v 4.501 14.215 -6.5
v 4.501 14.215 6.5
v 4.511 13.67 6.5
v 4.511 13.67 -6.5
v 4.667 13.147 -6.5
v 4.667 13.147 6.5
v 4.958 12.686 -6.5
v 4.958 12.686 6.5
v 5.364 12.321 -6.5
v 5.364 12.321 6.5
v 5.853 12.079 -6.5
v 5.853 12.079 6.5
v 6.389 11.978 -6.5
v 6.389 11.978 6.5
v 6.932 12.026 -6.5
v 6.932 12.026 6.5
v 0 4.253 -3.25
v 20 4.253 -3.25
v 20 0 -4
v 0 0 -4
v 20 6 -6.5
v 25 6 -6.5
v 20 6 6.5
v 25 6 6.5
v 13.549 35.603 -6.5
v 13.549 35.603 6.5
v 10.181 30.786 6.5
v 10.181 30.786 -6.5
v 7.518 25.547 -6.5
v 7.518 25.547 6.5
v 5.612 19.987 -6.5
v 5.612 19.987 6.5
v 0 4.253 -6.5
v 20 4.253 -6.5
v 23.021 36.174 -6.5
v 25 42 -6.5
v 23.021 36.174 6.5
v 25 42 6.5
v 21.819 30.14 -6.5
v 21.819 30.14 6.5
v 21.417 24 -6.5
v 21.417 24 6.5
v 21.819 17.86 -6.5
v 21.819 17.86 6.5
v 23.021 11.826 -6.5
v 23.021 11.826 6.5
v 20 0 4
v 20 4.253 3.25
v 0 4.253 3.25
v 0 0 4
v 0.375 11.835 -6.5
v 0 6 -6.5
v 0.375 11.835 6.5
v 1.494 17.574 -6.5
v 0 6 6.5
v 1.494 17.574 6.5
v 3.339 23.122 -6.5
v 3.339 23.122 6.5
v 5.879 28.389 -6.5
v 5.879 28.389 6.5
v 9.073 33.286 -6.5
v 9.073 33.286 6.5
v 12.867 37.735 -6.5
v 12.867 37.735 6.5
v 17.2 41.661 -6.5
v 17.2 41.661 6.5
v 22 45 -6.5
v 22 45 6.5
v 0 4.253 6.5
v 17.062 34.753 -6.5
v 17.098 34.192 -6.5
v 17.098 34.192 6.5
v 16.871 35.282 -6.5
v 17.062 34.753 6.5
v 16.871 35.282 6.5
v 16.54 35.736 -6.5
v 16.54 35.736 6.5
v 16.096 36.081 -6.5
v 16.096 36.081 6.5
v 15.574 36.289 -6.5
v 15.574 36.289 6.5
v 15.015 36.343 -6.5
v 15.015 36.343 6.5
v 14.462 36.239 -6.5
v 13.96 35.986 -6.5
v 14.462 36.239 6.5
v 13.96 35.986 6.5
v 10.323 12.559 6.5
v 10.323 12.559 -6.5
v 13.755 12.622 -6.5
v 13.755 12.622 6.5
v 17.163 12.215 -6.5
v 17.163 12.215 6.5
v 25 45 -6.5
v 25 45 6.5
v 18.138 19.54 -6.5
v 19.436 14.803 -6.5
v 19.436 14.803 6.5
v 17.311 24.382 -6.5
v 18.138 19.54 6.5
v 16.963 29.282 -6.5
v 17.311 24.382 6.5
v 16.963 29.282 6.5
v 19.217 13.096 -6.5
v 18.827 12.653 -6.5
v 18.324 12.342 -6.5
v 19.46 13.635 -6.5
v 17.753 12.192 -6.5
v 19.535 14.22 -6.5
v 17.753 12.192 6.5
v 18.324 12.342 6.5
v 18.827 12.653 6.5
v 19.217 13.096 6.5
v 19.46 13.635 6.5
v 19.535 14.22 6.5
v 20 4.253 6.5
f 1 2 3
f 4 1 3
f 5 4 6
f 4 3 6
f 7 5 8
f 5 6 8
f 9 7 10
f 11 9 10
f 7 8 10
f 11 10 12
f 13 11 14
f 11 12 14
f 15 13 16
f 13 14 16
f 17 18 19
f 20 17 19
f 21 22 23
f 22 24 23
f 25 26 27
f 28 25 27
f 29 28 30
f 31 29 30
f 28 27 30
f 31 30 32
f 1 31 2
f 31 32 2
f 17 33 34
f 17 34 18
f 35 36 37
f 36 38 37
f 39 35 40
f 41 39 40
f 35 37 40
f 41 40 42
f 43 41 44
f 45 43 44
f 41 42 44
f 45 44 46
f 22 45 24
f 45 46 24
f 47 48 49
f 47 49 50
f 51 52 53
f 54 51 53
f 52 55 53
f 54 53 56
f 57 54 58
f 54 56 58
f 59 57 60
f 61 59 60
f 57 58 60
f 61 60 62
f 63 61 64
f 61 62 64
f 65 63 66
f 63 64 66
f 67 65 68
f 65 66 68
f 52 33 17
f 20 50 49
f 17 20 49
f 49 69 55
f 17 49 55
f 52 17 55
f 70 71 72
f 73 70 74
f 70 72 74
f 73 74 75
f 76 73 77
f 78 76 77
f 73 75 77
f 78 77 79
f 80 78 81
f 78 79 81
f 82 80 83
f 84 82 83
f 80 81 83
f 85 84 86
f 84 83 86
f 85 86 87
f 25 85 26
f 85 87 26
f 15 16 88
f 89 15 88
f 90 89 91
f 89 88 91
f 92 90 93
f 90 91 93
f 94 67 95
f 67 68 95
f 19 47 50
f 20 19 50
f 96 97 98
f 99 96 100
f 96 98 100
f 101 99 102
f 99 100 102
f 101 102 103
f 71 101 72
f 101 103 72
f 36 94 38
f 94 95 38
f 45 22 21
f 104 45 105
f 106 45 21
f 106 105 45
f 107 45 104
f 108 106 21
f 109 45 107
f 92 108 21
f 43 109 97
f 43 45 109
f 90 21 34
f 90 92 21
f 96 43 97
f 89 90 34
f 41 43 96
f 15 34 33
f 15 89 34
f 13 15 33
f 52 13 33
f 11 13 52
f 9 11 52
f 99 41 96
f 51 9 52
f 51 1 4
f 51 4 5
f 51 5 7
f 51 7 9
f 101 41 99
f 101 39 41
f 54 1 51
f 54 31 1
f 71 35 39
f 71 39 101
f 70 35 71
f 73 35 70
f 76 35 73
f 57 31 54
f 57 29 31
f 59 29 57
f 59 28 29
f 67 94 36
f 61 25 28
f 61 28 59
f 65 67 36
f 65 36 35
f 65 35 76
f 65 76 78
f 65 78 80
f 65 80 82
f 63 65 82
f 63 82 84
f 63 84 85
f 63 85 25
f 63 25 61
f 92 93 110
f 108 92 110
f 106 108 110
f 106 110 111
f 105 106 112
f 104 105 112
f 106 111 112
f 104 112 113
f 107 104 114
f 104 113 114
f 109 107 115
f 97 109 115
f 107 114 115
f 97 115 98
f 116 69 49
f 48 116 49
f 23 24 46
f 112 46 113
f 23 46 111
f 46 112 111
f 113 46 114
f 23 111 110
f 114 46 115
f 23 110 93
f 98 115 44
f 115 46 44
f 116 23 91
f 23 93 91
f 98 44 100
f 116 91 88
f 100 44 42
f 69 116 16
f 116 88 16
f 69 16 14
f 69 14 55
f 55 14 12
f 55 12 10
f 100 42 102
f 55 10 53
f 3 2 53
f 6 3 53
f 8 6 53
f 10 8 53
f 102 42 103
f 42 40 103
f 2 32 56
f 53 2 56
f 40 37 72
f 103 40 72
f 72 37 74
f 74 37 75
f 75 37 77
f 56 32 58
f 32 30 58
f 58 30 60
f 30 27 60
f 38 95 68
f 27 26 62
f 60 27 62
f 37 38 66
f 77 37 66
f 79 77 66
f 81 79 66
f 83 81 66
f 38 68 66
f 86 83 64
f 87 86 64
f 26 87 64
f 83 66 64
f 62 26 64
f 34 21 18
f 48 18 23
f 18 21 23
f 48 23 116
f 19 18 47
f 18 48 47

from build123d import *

# Parameters (mm, degrees)
EXTRUDE_1_DEPTH     = 6.5
CUT_EXTRUDE_1_DEPTH = 52.886896226
CUT_EXTRUDE_2_DEPTH = 54.09425581


with BuildPart() as part:
    # 草图1 → 凸台-拉伸1 (new, symmetric)
    with BuildSketch(Plane.XY):
        with BuildLine():
            Line((0, 0), (0, 6))
            ThreePointArc((0, 6), (5.87927664, 28.388613177), (22, 45))
            Line((22, 45), (25, 45))
            Line((25, 45), (25, 42))
            ThreePointArc((25, 42), (21.416586692, 24), (25, 6))
            Line((25, 6), (20, 6))
            Line((20, 6), (20, 0))
            Line((20, 0), (0, 0))
        make_face()
    extrude(amount=EXTRUDE_1_DEPTH, both=True)

    # 草图2 → 切除-拉伸1 (cut, through all)
    with BuildSketch(Plane.ZY):
        Polygon((6.5, 4.253461365), (3.25, 4.253461365), (4, 0), (6.5, 0), align=None)
        Polygon((-4, 0), (-6.5, 0), (-6.5, 4.253461365), (-3.25, 4.253461365), align=None)
    extrude(amount=-CUT_EXTRUDE_1_DEPTH, mode=Mode.SUBTRACT)

    # 草图3 → 切除-拉伸2 (cut, through all)
    with BuildSketch(Plane.XY.offset(6.5)):
        with BuildLine():
            ThreePointArc((6.932463861, 12.026105414), (12.037858369, 12.649666202), (17.162813582, 12.215252555))
            ThreePointArc((17.162813582, 12.215252555), (19.038256161, 12.860028298), (19.436438993, 14.802828097))
            ThreePointArc((19.436438993, 14.802828097), (17.311240055, 24.38211379), (17.097768587, 34.191987125))
            ThreePointArc((17.097768587, 34.191987125), (15.842511021, 36.203388469), (13.548853711, 35.602936079))
            ThreePointArc((13.548853711, 35.602936079), (7.517605312, 25.546939135), (4.501465211, 14.215481563))
            ThreePointArc((4.501465211, 14.215481563), (5.148632601, 12.489739676), (6.932463861, 12.026105414))
        make_face()
    extrude(amount=-CUT_EXTRUDE_2_DEPTH, mode=Mode.SUBTRACT)


solid = part.part
